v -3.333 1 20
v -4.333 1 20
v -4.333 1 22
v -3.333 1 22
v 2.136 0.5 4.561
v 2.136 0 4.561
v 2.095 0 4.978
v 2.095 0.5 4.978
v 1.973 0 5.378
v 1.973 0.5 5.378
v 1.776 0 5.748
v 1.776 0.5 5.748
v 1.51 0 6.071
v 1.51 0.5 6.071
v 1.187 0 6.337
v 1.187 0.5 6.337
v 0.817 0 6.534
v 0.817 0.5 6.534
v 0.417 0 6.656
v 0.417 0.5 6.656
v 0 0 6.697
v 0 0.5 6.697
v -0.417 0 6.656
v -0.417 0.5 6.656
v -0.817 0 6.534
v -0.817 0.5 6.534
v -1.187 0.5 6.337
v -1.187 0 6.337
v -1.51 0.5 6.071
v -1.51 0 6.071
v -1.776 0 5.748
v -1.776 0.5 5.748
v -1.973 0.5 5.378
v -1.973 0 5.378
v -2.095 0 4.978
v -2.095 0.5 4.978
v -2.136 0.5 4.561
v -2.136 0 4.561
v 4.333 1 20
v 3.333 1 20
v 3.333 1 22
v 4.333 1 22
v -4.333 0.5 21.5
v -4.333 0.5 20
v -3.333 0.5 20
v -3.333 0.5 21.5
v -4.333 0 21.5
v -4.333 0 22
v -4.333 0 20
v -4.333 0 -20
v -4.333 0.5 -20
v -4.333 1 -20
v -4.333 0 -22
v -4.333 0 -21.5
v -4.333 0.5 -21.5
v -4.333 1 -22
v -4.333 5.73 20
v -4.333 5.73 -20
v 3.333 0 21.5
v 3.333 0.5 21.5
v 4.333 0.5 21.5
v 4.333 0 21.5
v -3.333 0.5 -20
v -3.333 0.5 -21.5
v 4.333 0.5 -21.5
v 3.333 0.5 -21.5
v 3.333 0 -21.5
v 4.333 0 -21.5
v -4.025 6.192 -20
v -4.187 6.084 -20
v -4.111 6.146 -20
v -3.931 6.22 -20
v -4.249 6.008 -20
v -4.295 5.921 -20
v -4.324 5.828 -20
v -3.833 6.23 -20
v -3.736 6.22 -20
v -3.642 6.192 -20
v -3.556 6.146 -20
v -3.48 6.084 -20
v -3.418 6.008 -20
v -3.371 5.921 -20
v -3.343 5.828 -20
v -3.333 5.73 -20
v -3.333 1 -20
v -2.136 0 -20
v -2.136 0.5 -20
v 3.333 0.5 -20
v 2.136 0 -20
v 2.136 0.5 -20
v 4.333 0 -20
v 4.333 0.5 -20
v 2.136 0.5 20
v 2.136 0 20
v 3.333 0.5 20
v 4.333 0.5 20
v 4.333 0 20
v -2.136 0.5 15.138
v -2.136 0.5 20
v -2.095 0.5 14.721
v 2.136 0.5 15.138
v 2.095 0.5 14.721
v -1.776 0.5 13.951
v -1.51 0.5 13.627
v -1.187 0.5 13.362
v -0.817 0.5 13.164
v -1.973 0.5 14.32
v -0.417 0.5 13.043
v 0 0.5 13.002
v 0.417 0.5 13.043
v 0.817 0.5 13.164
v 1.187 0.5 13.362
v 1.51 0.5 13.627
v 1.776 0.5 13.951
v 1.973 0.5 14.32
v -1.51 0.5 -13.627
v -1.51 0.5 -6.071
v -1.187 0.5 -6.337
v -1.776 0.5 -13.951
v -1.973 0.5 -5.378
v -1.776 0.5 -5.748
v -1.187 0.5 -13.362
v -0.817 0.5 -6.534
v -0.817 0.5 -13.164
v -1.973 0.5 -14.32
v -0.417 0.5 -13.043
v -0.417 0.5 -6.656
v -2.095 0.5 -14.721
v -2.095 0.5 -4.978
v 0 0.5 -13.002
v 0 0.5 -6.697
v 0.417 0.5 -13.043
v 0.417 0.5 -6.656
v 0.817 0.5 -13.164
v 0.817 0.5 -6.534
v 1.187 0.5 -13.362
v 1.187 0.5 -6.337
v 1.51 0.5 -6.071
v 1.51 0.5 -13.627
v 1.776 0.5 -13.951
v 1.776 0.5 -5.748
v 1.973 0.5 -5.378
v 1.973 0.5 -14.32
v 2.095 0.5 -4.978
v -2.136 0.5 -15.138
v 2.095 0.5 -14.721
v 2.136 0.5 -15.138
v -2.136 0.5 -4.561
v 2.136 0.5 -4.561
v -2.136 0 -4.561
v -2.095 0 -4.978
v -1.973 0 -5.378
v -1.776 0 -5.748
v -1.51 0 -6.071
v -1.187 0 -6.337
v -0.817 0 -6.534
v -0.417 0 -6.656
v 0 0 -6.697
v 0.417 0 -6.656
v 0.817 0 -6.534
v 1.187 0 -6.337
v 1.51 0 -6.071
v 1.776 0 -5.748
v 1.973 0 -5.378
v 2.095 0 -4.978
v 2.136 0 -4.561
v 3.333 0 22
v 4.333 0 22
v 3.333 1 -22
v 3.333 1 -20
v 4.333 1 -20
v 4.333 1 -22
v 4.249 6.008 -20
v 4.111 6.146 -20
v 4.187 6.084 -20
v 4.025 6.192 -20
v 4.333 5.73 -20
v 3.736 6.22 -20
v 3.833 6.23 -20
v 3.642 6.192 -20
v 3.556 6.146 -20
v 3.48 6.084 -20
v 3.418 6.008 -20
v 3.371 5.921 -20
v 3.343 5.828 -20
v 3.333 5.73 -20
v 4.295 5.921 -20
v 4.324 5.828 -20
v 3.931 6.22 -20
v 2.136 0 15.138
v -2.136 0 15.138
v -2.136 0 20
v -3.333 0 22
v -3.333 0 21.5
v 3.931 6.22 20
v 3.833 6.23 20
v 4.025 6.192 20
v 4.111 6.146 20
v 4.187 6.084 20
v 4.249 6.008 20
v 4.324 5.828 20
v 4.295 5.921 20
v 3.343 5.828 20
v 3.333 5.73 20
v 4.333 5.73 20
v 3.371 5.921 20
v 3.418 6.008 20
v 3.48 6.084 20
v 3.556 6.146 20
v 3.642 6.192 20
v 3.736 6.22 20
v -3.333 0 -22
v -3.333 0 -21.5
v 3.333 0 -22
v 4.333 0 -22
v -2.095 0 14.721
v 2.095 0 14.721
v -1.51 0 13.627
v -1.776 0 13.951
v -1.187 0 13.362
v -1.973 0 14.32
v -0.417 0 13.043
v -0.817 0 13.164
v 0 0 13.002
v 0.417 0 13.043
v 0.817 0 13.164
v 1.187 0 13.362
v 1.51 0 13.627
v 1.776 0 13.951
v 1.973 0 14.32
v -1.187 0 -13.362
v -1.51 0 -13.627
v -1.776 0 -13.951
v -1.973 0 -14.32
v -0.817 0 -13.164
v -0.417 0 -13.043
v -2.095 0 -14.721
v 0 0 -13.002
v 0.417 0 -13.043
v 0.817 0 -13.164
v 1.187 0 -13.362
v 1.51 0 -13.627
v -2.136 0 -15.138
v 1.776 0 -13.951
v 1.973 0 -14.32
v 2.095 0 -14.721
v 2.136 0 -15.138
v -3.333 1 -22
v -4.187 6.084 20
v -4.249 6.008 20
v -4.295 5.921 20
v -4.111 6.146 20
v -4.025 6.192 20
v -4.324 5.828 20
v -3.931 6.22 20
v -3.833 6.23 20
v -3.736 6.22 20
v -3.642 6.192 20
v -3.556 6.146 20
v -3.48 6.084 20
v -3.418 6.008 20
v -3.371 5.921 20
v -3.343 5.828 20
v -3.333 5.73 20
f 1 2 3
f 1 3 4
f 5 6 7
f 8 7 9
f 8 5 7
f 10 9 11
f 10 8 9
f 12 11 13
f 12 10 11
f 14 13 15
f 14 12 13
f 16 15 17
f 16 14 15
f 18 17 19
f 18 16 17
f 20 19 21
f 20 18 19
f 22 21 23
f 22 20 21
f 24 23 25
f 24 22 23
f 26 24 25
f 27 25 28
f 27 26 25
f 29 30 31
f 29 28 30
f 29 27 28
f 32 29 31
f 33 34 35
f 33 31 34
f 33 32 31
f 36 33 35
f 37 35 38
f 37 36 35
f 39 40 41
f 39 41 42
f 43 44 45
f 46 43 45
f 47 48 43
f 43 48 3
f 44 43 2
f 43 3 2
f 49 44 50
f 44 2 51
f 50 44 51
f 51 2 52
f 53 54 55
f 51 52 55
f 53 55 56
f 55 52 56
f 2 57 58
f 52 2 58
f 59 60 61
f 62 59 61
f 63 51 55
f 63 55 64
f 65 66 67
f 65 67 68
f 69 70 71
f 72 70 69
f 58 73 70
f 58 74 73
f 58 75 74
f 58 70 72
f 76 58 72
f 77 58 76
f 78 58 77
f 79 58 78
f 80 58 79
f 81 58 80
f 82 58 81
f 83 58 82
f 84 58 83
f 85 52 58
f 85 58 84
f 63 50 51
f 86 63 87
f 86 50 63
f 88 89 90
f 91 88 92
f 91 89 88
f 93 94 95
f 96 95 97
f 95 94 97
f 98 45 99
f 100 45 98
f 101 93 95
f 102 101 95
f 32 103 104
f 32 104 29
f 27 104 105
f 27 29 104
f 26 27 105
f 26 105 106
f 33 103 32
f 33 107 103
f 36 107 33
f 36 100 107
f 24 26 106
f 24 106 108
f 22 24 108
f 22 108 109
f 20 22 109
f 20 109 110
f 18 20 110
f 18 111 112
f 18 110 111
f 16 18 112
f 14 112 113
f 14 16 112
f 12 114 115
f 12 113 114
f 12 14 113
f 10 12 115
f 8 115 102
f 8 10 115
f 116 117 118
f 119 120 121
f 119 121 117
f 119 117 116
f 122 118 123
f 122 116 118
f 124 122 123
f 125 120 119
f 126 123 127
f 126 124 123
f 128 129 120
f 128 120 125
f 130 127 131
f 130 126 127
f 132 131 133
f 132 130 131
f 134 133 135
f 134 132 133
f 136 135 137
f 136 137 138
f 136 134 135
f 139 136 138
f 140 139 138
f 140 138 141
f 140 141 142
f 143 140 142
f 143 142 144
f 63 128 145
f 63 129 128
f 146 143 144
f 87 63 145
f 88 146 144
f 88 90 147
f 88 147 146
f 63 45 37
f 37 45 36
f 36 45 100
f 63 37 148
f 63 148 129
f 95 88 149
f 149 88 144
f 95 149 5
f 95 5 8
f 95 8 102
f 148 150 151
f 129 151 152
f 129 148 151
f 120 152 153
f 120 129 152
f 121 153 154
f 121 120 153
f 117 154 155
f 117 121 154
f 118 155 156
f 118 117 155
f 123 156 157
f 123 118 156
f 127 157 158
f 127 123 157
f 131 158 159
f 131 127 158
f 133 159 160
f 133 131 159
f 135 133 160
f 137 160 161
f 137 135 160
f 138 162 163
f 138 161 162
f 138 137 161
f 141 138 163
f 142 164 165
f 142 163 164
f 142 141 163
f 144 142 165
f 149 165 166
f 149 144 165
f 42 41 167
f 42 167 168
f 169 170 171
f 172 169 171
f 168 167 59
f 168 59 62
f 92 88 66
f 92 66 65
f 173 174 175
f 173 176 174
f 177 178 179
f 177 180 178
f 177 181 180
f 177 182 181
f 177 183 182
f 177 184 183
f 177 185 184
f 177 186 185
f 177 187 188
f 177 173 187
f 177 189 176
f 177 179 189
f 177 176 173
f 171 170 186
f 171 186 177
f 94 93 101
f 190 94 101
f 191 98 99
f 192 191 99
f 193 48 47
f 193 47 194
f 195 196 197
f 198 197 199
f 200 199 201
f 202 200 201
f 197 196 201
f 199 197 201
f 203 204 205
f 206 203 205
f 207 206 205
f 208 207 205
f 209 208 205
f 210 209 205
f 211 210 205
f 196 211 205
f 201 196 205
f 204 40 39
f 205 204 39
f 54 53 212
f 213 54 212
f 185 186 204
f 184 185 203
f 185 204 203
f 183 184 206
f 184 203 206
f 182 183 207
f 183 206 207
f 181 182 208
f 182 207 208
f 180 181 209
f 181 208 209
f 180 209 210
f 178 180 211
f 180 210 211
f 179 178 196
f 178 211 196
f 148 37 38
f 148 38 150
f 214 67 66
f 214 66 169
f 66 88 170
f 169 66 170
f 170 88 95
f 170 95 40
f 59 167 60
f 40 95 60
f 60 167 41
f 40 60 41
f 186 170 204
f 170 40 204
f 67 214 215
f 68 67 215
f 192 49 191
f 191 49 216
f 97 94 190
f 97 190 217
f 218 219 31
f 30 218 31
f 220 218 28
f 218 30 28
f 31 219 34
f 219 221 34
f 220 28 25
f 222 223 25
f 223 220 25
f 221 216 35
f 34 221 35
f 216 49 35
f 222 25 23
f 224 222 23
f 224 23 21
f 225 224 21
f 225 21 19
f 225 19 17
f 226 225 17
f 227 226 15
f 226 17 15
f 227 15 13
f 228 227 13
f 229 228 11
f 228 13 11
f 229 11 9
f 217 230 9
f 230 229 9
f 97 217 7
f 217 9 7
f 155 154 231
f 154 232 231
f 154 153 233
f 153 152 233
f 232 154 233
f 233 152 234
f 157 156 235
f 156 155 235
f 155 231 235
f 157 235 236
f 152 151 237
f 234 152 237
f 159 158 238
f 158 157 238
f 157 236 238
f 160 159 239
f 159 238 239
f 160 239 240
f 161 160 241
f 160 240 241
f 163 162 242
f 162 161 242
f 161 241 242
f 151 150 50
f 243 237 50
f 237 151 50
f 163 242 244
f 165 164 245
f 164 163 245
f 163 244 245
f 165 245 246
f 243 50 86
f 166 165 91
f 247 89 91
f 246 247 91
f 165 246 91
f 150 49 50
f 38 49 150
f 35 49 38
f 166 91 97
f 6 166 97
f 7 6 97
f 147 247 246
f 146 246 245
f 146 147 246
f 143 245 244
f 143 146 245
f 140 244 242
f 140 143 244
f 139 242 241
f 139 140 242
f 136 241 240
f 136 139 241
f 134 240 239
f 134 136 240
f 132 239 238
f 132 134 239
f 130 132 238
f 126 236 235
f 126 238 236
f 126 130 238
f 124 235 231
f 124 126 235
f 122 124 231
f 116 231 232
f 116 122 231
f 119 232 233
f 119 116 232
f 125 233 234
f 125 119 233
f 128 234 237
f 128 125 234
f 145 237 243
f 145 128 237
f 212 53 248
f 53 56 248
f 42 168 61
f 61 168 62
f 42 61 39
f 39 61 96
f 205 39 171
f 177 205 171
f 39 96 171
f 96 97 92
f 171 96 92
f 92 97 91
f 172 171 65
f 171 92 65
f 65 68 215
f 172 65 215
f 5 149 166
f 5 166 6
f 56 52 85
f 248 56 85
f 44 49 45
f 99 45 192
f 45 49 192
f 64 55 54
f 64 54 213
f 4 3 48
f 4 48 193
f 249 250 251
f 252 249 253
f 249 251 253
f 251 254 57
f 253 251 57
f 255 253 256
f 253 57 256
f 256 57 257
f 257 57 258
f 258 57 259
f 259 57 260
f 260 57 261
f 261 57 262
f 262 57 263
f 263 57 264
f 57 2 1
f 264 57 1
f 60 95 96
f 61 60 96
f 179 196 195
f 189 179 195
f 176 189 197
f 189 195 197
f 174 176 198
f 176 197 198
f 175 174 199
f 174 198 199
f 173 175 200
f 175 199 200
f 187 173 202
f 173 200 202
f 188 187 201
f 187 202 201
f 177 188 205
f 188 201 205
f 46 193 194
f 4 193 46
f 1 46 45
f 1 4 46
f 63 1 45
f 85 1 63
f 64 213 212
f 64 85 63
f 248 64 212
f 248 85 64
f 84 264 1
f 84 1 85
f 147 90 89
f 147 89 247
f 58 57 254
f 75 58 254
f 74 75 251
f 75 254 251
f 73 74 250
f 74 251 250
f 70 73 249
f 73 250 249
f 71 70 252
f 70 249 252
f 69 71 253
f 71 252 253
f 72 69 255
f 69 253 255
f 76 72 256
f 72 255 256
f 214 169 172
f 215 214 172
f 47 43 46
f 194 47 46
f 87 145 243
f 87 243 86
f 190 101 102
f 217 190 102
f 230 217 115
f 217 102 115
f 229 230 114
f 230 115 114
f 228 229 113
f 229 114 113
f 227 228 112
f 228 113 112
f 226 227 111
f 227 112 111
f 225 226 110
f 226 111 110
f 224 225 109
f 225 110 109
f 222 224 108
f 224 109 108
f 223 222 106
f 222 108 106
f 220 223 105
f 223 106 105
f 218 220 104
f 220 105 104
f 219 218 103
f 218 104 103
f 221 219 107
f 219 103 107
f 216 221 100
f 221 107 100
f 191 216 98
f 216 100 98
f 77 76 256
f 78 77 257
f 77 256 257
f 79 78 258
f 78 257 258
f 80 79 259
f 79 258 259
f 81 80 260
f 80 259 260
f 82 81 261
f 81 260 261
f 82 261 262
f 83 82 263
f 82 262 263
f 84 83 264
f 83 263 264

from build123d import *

# Parameters (mm, degrees)
SKETCH1_W           = 6.666666666
SKETCH1_H           = 40
BOSS_EXTRUDE1_DEPTH = 0.5
SKETCH1_3_W         = 1
SKETCH1_3_H         = 40
BOSS_EXTRUDE2_DEPTH = 6.23
SKETCH2_W           = 1
SKETCH2_H           = 0.5
BOSS_EXTRUDE3_DEPTH = 2
SKETCH3_W           = 1
SKETCH3_H           = 0.5
BOSS_EXTRUDE4_DEPTH = 0.5
CUT_EXTRUDE1_DEPTH  = 43.680096975
CUT_EXTRUDE2_DEPTH  = 24.143264199


with BuildPart() as part:
    # Sketch1 → Boss-Extrude1 (new body)
    with BuildSketch(Plane(origin=(0, 0, 0), x_dir=(1, 0, 0), z_dir=(0, 1, 0))):
        Rectangle(SKETCH1_W, SKETCH1_H)
    extrude(amount=BOSS_EXTRUDE1_DEPTH)

    # Sketch1<3> → Boss-Extrude2 (add)
    with BuildSketch(Plane(origin=(0, 0, 0), x_dir=(1, 0, 0), z_dir=(0, 1, 0))):
        with Locations((-3.833333333, 0)):
            Rectangle(SKETCH1_3_W, SKETCH1_3_H)
        with Locations((3.833333333, 0)):
            Rectangle(SKETCH1_3_W, SKETCH1_3_H)
    extrude(amount=BOSS_EXTRUDE2_DEPTH)

    # Sketch2 → Boss-Extrude3 (add)
    with BuildSketch(Plane.XY.offset(20)):
        with Locations((-3.833333333, 0.75)):
            Rectangle(SKETCH2_W, SKETCH2_H)
        with Locations((3.833333333, 0.75)):
            Rectangle(SKETCH2_W, SKETCH2_H)
    boss_extrude3 = extrude(amount=BOSS_EXTRUDE3_DEPTH)

    # Sketch3 → Boss-Extrude4 (add)
    with BuildSketch(Plane.XZ.offset(-0.5)):
        with Locations((-3.833333333, 21.75)):
            Rectangle(SKETCH3_W, SKETCH3_H)
        with Locations((3.833333333, 21.75)):
            Rectangle(SKETCH3_W, SKETCH3_H)
    boss_extrude4 = extrude(amount=BOSS_EXTRUDE4_DEPTH)

    # Mirror1: Boss-Extrude3, Boss-Extrude4 across plane
    add(boss_extrude3.mirror(Plane.XY))
    add(boss_extrude4.mirror(Plane.XY))

    # Sketch5 → Cut-Extrude1 (cut, through all)
    with BuildSketch(Plane.XY.offset(20)):
        with BuildLine():
            Line((-4.333333333, 6.23), (-4.333333333, 5.73))
            ThreePointArc((-4.333333333, 5.73), (-4.186886724, 6.083553391), (-3.833333333, 6.23))
            Line((-3.833333333, 6.23), (-4.333333333, 6.23))
        make_face()
        with BuildLine():
            Line((-3.333333333, 6.23), (-3.833333333, 6.23))
            ThreePointArc((-3.833333333, 6.23), (-3.479779943, 6.083553391), (-3.333333333, 5.73))
            Line((-3.333333333, 5.73), (-3.333333333, 6.23))
        make_face()
        with BuildLine():
            Line((3.833333333, 6.23), (3.333333333, 6.23))
            Line((3.333333333, 6.23), (3.333333333, 5.73))
            ThreePointArc((3.333333333, 5.73), (3.479779943, 6.083553391), (3.833333333, 6.23))
        make_face()
        with BuildLine():
            Line((4.333333333, 6.23), (3.833333333, 6.23))
            ThreePointArc((3.833333333, 6.23), (4.186886724, 6.083553391), (4.333333333, 5.73))
            Line((4.333333333, 5.73), (4.333333333, 6.23))
        make_face()
    extrude(amount=-CUT_EXTRUDE1_DEPTH, mode=Mode.SUBTRACT)

    # Sketch6 → Cut-Extrude2 (cut, through all)
    with BuildSketch(Plane(origin=(0, 0.5, 0), x_dir=(1, 0, 0), z_dir=(0, 1, 0))):
        with BuildLine():
            Line((2.13569746, 4.561085027), (2.13569746, -4.561085027))
            ThreePointArc((2.13569746, -4.561085027), (0, -6.696782487), (-2.13569746, -4.561085027))
            Line((-2.13569746, -4.561085027), (-2.13569746, 4.561085027))
            ThreePointArc((-2.13569746, 4.561085027), (0, 6.696782487), (2.13569746, 4.561085027))
        make_face()
        with BuildLine():
            Line((2.13569746, 24.862478311), (2.13569746, 15.137521689))
            ThreePointArc((2.13569746, 15.137521689), (0, 13.001824229), (-2.13569746, 15.137521689))
            Line((-2.13569746, 15.137521689), (-2.13569746, 24.862478311))
            ThreePointArc((-2.13569746, 24.862478311), (0, 26.998175771), (2.13569746, 24.862478311))
        make_face()
        with BuildLine():
            Line((2.13569746, -24.862478311), (2.13569746, -15.137521689))
            ThreePointArc((2.13569746, -15.137521689), (0, -13.001824229), (-2.13569746, -15.137521689))
            Line((-2.13569746, -15.137521689), (-2.13569746, -24.862478311))
            ThreePointArc((-2.13569746, -24.862478311), (0, -26.998175771), (2.13569746, -24.862478311))
        make_face()
    extrude(amount=-CUT_EXTRUDE2_DEPTH, mode=Mode.SUBTRACT)


solid = part.part
